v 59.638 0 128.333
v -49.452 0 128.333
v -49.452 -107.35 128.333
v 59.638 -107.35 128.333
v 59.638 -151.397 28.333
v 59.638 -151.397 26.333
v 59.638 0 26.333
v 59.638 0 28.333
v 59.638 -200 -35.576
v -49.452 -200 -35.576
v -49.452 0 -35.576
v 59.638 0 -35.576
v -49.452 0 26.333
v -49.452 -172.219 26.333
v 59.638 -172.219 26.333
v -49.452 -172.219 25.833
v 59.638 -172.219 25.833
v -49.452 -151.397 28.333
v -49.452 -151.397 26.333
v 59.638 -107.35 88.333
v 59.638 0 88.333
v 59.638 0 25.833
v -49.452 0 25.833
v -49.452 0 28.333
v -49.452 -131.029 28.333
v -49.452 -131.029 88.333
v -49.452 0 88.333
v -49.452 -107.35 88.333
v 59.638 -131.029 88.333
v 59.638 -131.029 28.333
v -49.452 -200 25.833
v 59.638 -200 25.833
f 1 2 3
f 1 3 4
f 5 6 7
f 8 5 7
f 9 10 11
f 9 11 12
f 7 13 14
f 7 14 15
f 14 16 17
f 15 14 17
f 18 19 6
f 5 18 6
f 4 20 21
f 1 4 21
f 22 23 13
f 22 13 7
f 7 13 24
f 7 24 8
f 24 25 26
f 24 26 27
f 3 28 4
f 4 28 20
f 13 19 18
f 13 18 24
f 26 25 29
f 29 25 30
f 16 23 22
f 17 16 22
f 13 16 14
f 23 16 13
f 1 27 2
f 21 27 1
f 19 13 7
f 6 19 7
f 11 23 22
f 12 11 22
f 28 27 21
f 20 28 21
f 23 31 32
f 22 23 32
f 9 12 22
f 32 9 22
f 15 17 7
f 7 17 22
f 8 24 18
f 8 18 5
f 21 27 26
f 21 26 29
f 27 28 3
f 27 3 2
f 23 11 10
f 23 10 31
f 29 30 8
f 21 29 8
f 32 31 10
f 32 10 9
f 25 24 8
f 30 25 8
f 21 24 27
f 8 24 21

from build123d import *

# Parameters (mm, degrees)
F0_W     = 109.089673
F0_H     = 61.409078
F1_DEPTH = 200
F2_W     = 109.089673
F2_H     = 172.21871
F3_DEPTH = 0.5
F4_W     = 109.089673
F4_H     = 151.397005
F5_DEPTH = 2
F6_W     = 109.089673
F6_H     = 131.028727
F7_DEPTH = 60
F8_W     = 109.089673
F8_H     = 107.349873
F9_DEPTH = 40


with BuildPart() as f1:
    # F0 (on Front) → F1 (new body)
    with BuildSketch(Plane.XZ):
        with Locations((5.09283, -4.871372)):
            Rectangle(F0_W, F0_H)
    extrude(amount=F1_DEPTH)


with BuildPart() as f3:
    # F2 (on face) → F3 (new body)
    with BuildSketch(Plane.XY.offset(25.833167)):
        with Locations((5.09283, -86.109355)):
            Rectangle(F2_W, F2_H)
    extrude(amount=F3_DEPTH)


with BuildPart() as f5:
    # F4 (on face) → F5 (new body)
    with BuildSketch(Plane.XY.offset(26.333167)):
        with Locations((5.09283, -75.698503)):
            Rectangle(F4_W, F4_H)
    extrude(amount=F5_DEPTH)


with BuildPart() as f7:
    # F6 (on face) → F7 (new body)
    with BuildSketch(Plane.XY.offset(28.333167)):
        with Locations((5.09283, -65.514364)):
            Rectangle(F6_W, F6_H)
    extrude(amount=F7_DEPTH)


with BuildPart() as f9:
    # F8 (on face) → F9 (new body)
    with BuildSketch(Plane.XY.offset(88.333167)):
        with Locations((5.09283, -53.674936)):
            Rectangle(F8_W, F8_H)
    extrude(amount=F9_DEPTH)


solid = Compound([f1.part, f3.part, f5.part, f7.part, f9.part])
